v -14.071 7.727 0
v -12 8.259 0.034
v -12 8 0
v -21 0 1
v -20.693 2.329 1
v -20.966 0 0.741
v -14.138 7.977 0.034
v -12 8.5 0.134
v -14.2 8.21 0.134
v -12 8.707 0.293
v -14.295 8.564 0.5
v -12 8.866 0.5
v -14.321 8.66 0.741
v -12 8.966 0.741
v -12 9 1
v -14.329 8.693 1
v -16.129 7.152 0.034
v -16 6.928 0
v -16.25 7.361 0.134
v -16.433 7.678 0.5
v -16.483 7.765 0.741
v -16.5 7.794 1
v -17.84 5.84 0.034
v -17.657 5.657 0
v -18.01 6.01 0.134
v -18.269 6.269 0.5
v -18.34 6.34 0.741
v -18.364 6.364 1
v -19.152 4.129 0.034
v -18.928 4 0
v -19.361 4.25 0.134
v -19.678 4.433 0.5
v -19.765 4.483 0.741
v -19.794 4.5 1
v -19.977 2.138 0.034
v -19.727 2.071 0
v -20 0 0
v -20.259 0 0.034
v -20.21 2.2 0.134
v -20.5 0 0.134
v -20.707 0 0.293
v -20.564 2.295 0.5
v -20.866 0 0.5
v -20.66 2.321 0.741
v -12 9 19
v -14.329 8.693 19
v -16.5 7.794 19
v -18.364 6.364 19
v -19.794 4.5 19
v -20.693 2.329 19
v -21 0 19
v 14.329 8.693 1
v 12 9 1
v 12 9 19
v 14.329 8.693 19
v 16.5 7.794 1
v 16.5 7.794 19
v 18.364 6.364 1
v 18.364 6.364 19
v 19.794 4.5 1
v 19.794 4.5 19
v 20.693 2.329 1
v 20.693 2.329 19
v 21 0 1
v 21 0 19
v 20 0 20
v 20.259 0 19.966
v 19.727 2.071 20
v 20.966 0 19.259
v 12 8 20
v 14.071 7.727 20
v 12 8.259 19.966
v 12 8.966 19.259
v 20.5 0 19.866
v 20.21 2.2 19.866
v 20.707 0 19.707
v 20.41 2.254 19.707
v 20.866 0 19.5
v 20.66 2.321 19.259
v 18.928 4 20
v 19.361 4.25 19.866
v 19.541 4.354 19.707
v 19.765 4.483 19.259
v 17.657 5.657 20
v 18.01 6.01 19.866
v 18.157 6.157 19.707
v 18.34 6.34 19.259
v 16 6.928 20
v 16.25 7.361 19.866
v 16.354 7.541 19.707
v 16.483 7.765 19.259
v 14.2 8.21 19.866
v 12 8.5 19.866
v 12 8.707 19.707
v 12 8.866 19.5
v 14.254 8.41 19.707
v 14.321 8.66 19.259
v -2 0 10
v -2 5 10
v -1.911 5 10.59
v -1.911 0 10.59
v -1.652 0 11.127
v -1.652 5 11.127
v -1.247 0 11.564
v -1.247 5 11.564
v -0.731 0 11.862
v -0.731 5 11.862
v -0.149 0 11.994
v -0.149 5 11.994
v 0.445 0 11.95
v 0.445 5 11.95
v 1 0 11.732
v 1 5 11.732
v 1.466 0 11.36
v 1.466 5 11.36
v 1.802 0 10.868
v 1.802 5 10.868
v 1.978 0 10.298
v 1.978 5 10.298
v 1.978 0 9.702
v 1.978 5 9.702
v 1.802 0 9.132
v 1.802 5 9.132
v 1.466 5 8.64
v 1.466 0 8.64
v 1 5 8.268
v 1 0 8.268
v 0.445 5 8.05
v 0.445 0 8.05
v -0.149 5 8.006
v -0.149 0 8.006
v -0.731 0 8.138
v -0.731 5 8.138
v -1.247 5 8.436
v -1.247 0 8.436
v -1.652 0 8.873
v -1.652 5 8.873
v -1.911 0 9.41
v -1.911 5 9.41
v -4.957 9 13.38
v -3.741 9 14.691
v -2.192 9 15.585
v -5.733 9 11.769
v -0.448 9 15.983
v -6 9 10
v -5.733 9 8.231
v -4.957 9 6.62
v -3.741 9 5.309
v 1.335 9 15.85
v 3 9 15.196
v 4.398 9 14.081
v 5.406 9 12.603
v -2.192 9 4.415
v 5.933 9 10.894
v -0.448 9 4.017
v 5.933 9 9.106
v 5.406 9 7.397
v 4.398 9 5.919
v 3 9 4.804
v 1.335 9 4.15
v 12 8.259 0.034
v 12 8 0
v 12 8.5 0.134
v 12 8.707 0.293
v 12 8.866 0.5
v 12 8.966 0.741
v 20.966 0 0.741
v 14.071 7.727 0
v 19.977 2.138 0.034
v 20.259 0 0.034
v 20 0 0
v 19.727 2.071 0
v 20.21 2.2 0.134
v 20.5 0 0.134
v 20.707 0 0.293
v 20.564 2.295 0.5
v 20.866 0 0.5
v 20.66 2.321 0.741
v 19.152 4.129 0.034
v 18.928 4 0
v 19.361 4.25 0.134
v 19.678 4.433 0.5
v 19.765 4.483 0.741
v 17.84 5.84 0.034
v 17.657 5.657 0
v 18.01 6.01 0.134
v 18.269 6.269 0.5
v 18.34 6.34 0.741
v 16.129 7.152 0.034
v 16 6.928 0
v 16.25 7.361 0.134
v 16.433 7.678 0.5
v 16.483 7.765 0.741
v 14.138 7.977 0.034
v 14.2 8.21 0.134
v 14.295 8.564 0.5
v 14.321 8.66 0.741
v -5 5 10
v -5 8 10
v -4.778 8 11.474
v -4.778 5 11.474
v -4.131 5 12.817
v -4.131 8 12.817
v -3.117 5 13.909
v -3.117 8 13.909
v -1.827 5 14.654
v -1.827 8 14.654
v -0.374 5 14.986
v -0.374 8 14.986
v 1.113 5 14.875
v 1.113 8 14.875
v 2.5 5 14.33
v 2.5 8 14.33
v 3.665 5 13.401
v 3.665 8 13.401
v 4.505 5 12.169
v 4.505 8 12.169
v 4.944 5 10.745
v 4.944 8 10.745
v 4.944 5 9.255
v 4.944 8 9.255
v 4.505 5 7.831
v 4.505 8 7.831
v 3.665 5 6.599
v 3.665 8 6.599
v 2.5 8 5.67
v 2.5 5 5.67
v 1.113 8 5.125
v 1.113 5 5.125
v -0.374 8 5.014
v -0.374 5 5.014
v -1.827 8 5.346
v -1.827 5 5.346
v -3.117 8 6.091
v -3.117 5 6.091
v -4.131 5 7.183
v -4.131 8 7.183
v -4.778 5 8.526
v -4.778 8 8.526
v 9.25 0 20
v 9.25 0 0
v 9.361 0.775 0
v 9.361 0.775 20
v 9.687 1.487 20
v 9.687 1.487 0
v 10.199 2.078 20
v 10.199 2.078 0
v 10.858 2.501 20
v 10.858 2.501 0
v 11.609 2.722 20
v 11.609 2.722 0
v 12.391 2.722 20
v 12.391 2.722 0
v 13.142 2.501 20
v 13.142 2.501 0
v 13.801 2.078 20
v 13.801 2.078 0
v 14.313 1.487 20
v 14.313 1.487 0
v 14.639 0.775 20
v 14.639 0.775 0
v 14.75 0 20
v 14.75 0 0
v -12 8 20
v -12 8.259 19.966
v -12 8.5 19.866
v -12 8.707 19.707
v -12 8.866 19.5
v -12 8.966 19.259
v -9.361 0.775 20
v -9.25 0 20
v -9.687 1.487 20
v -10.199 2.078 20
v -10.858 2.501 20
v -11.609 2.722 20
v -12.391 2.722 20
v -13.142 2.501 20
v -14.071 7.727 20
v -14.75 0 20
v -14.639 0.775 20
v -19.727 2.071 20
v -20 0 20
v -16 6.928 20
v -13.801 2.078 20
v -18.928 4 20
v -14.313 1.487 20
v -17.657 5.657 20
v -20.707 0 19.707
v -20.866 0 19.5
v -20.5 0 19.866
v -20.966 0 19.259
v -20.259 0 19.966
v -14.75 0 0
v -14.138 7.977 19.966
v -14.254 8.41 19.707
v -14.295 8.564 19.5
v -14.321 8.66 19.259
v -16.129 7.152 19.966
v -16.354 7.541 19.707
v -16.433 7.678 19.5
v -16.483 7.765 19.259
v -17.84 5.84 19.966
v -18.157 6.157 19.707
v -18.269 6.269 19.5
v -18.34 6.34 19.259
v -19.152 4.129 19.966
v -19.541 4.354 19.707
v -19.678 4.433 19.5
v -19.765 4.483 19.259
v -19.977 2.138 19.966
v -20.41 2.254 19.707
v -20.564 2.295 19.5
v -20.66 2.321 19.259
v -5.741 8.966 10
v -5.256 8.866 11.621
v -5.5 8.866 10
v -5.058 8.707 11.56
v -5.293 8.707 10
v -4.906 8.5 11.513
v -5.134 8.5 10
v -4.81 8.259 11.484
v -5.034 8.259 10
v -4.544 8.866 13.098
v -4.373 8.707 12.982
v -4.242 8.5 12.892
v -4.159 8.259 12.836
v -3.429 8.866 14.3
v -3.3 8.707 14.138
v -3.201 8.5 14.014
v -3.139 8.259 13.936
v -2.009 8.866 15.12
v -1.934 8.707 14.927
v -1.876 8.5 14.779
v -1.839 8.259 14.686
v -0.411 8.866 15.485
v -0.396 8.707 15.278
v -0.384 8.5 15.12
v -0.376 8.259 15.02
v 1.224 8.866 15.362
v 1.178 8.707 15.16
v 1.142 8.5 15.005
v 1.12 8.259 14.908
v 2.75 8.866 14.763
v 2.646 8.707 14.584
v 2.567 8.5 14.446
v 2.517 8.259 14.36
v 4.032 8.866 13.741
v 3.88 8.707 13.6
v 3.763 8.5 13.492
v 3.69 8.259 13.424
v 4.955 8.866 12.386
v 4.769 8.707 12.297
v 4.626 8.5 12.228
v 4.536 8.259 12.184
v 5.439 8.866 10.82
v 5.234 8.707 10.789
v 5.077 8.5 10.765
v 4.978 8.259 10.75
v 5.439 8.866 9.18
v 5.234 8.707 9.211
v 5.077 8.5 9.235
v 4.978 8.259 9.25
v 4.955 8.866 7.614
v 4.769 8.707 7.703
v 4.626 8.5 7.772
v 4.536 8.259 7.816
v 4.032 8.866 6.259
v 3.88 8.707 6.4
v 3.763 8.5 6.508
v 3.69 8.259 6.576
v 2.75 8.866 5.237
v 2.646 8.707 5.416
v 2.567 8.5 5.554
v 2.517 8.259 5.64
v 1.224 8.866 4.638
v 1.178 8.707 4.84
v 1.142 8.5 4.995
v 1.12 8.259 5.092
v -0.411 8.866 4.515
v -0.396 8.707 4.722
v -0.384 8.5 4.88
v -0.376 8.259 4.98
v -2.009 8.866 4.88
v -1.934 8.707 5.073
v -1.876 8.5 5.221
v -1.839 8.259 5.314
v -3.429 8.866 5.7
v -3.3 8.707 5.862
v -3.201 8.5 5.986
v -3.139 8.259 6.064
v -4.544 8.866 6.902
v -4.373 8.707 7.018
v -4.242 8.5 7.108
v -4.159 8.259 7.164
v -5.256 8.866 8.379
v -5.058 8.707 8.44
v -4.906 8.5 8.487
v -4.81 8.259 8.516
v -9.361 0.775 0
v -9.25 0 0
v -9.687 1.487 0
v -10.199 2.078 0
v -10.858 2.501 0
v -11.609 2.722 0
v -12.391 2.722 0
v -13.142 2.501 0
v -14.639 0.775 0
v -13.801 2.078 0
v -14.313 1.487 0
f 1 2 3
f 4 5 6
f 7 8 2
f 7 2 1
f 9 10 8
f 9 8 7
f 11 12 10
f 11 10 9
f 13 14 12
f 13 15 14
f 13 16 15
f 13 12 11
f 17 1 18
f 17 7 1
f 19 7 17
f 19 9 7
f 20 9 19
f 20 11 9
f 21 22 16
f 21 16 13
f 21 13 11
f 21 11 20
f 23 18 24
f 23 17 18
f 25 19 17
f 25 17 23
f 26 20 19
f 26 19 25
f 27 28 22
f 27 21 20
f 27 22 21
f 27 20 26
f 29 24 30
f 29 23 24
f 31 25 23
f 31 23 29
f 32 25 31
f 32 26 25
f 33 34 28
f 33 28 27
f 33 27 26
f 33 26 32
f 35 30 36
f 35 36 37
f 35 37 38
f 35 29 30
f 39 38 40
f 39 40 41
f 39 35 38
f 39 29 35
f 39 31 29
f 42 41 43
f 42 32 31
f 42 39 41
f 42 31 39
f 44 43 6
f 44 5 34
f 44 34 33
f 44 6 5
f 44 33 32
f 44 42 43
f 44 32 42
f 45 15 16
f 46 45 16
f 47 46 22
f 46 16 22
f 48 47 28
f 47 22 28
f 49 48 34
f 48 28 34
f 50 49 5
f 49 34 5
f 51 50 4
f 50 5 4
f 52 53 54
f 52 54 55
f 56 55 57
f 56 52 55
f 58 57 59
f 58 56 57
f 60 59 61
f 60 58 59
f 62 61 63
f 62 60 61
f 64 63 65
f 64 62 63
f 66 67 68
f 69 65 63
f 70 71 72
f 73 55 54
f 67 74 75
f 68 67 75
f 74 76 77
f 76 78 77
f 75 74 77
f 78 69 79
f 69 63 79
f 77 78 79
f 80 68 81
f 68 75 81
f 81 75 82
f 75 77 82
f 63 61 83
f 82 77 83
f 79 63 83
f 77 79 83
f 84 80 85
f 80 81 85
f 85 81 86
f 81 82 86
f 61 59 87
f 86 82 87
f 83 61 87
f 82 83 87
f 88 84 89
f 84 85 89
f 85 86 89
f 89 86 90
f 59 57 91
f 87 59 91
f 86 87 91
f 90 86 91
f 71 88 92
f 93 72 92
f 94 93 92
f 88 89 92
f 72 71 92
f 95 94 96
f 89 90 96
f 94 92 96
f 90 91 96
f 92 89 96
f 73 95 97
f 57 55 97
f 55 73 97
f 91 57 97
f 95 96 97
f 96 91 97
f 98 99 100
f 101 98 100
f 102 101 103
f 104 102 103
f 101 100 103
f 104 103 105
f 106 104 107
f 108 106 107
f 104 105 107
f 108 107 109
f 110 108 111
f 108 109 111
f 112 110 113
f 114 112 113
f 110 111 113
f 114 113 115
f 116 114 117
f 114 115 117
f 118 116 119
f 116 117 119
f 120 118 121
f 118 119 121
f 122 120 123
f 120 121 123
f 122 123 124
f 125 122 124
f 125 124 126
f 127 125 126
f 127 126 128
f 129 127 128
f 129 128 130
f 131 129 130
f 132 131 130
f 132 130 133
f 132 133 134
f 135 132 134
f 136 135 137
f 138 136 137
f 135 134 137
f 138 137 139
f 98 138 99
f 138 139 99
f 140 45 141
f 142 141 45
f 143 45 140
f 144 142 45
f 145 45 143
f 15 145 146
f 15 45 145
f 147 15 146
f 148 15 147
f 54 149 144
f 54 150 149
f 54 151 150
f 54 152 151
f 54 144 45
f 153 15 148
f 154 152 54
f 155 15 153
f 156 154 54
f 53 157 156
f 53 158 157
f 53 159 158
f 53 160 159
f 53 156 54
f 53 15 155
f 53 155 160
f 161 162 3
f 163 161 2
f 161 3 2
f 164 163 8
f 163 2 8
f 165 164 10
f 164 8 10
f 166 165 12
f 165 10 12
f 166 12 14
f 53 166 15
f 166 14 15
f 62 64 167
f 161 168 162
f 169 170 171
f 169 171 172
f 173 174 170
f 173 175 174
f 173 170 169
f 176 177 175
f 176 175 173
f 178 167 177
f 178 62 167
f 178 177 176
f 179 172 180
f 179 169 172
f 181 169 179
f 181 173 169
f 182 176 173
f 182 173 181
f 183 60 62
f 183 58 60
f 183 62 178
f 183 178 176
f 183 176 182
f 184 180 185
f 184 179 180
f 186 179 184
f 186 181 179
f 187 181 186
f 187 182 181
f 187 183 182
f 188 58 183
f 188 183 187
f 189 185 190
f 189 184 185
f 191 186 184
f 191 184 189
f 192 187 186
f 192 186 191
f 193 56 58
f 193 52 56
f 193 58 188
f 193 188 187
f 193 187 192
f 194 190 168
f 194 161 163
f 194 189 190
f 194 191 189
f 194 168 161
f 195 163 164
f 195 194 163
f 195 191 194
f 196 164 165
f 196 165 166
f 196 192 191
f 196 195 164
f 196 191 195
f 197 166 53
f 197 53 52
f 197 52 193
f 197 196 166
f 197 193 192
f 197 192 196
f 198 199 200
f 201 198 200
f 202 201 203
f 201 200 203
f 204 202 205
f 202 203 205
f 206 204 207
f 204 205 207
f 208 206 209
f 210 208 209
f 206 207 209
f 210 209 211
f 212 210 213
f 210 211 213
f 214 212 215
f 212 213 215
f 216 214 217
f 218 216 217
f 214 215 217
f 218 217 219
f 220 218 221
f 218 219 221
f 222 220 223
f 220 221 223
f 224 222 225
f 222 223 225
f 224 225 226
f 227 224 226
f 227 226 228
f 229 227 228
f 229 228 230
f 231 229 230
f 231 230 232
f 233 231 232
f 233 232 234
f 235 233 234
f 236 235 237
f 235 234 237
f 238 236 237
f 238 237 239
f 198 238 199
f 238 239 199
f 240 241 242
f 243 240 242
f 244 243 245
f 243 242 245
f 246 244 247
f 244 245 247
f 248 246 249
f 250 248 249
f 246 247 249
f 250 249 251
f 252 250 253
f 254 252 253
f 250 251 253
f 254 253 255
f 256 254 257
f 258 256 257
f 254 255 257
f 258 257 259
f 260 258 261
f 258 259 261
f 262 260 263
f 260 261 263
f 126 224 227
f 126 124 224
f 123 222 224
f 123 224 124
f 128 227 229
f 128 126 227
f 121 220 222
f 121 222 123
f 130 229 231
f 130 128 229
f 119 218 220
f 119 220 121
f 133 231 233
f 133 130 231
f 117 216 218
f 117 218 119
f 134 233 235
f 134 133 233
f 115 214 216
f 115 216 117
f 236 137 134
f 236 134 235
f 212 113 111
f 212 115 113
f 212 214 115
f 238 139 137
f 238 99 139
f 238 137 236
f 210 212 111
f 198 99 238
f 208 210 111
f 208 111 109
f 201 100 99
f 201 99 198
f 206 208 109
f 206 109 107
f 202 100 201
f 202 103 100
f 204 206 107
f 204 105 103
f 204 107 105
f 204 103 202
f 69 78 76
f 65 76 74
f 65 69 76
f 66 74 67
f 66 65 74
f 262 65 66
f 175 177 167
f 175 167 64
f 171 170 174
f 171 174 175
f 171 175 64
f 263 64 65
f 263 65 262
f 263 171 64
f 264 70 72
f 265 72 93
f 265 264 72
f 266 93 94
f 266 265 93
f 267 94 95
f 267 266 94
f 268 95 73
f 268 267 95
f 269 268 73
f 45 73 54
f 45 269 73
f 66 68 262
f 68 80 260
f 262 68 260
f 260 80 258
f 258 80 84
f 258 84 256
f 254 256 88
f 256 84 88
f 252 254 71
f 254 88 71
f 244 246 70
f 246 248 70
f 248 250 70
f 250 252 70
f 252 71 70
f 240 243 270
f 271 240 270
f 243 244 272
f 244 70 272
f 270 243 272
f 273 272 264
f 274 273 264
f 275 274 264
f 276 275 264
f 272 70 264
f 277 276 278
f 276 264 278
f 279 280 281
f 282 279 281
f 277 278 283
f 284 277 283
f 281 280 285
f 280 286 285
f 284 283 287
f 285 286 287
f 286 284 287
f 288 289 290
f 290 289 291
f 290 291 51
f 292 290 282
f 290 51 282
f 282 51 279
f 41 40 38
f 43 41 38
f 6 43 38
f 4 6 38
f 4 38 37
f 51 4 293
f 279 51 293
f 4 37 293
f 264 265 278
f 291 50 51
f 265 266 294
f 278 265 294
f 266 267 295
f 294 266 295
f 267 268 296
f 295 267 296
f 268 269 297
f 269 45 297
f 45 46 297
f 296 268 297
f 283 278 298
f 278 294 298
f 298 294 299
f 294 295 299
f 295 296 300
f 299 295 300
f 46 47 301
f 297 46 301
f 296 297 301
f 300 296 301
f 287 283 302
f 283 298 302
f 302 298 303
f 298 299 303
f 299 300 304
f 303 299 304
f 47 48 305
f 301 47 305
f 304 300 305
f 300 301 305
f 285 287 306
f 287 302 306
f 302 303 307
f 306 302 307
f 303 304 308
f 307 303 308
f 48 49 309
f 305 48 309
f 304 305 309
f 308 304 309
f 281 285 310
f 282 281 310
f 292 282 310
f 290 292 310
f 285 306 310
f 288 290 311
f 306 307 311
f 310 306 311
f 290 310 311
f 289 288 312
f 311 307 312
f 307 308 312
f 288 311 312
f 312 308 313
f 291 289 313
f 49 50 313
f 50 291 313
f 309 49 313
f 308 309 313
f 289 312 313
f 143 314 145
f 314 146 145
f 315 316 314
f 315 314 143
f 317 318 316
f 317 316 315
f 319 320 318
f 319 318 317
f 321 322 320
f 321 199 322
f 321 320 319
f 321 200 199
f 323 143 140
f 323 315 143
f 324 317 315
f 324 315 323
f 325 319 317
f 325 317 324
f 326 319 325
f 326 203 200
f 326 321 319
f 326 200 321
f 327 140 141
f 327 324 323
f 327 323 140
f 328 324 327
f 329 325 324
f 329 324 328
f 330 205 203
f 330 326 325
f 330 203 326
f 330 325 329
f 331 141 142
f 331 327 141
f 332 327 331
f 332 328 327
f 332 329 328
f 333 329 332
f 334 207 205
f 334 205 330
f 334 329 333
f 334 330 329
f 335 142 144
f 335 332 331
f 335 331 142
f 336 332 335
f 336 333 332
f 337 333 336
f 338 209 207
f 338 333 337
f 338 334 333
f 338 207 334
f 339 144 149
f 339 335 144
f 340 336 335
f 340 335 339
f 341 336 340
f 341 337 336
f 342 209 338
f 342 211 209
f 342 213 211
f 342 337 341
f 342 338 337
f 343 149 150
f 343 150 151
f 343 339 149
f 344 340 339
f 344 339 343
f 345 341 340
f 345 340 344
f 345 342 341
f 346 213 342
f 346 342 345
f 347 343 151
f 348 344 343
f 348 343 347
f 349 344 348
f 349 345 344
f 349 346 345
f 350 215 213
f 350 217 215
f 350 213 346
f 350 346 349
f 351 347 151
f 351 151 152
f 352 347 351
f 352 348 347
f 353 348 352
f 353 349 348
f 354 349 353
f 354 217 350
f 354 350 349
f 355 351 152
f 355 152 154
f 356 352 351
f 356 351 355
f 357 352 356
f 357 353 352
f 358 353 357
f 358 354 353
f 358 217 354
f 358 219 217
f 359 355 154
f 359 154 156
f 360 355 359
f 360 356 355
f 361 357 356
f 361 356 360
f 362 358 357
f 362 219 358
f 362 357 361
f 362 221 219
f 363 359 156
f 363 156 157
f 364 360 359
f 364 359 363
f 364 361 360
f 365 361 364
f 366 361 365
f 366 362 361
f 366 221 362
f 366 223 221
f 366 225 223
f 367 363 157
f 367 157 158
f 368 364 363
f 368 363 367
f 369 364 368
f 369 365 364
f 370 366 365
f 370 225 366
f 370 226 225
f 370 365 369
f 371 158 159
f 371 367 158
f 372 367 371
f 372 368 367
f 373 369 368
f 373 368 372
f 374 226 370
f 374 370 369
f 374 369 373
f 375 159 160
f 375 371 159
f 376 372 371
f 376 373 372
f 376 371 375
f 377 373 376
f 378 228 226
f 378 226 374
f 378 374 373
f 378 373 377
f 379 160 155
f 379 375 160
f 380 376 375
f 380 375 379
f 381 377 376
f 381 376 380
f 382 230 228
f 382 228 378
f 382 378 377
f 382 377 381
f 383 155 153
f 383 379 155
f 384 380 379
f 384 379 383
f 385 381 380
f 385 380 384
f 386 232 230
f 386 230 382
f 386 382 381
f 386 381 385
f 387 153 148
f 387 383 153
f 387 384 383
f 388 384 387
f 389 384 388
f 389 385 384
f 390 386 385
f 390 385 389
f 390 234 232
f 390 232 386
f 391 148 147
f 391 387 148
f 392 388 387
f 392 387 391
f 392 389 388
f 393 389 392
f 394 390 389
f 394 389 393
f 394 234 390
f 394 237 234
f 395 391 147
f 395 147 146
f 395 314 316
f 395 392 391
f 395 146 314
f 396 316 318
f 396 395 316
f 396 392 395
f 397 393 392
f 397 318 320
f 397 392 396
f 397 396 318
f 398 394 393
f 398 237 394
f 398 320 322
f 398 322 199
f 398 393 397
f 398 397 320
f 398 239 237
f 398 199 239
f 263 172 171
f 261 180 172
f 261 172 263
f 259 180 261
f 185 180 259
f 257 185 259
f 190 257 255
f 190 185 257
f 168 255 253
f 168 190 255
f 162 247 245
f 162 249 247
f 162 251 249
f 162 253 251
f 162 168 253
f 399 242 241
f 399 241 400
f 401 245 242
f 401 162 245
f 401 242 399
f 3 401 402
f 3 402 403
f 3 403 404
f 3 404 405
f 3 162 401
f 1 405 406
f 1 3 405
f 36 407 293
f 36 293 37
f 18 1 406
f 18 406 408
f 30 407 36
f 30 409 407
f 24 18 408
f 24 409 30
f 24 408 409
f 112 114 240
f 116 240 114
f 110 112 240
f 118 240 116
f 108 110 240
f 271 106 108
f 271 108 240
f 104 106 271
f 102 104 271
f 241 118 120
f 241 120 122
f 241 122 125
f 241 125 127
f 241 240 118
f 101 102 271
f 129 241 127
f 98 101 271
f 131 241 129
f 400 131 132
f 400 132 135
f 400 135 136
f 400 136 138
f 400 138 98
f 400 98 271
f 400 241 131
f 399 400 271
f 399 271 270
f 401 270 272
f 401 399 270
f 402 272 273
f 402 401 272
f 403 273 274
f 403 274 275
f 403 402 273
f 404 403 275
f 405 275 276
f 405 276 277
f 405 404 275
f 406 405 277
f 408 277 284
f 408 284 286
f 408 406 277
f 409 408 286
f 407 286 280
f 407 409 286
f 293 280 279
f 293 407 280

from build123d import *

# Parameters (mm, degrees)
PAD_DEPTH       = 20
SKETCH001_R     = 5
POCKET_DEPTH    = 4
SKETCH002_R     = 2
POCKET001_DEPTH = 5
FILLET_R        = 1
FILLET001_R     = 1


with BuildPart() as part:
    # Sketch → Pad (new body)
    with BuildSketch(Plane.XY):
        with BuildLine():
            Line((0, 0), (0, 9))
            Line((0, 9), (-12, 9))
            ThreePointArc((-12, 9), (-18.363961, 6.363961), (-21, 0))
            Line((-21, 0), (-14.75, 0))
            ThreePointArc((-9.25, 0), (-12, 2.75), (-14.75, 0))
            Line((-9.25, 0), (0, 0))
        make_face()
    extrude(amount=PAD_DEPTH)

    # Mirrored: part across YZ


with BuildPart() as part_1:
    add(part.part)
    add(part.part.mirror(Plane.YZ))

    # Sketch001 (on Face1 of Mirrored) → Pocket (cut)
    with BuildSketch(Plane(origin=(0, 9, 0), x_dir=(-1, 0, 0), z_dir=(0, 1, 0))):
        with Locations((0, 10)):
            Circle(SKETCH001_R)
    extrude(amount=-POCKET_DEPTH, mode=Mode.SUBTRACT)

    # Sketch002 (on Face13 of Pocket) → Pocket001 (cut)
    with BuildSketch(Plane(origin=(0, 5, 0), x_dir=(-1, 0, 0), z_dir=(0, 1, 0))):
        with Locations((0, 10)):
            Circle(SKETCH002_R)
    extrude(amount=-POCKET001_DEPTH, mode=Mode.SUBTRACT)

    # Fillet
    fillet_edges = [part_1.edges().sort_by_distance(p)[0] for p in [
        (-18.363961, 6.363961, 20),
        (-6, 9, 20),
        (6, 9, 20),
        (18.363961, 6.363961, 20),
        (-18.363961, 6.363961, 0),
        (-6, 9, 0),
        (6, 9, 0),
        (18.363961, 6.363961, 0),
    ]]
    fillet(fillet_edges, radius=FILLET_R)

    # Fillet001
    fillet001_edges = [part_1.edges().sort_by_distance(p)[0] for p in [
        (5, 9, 10),
    ]]
    fillet(fillet001_edges, radius=FILLET001_R)


solid = part_1.part
